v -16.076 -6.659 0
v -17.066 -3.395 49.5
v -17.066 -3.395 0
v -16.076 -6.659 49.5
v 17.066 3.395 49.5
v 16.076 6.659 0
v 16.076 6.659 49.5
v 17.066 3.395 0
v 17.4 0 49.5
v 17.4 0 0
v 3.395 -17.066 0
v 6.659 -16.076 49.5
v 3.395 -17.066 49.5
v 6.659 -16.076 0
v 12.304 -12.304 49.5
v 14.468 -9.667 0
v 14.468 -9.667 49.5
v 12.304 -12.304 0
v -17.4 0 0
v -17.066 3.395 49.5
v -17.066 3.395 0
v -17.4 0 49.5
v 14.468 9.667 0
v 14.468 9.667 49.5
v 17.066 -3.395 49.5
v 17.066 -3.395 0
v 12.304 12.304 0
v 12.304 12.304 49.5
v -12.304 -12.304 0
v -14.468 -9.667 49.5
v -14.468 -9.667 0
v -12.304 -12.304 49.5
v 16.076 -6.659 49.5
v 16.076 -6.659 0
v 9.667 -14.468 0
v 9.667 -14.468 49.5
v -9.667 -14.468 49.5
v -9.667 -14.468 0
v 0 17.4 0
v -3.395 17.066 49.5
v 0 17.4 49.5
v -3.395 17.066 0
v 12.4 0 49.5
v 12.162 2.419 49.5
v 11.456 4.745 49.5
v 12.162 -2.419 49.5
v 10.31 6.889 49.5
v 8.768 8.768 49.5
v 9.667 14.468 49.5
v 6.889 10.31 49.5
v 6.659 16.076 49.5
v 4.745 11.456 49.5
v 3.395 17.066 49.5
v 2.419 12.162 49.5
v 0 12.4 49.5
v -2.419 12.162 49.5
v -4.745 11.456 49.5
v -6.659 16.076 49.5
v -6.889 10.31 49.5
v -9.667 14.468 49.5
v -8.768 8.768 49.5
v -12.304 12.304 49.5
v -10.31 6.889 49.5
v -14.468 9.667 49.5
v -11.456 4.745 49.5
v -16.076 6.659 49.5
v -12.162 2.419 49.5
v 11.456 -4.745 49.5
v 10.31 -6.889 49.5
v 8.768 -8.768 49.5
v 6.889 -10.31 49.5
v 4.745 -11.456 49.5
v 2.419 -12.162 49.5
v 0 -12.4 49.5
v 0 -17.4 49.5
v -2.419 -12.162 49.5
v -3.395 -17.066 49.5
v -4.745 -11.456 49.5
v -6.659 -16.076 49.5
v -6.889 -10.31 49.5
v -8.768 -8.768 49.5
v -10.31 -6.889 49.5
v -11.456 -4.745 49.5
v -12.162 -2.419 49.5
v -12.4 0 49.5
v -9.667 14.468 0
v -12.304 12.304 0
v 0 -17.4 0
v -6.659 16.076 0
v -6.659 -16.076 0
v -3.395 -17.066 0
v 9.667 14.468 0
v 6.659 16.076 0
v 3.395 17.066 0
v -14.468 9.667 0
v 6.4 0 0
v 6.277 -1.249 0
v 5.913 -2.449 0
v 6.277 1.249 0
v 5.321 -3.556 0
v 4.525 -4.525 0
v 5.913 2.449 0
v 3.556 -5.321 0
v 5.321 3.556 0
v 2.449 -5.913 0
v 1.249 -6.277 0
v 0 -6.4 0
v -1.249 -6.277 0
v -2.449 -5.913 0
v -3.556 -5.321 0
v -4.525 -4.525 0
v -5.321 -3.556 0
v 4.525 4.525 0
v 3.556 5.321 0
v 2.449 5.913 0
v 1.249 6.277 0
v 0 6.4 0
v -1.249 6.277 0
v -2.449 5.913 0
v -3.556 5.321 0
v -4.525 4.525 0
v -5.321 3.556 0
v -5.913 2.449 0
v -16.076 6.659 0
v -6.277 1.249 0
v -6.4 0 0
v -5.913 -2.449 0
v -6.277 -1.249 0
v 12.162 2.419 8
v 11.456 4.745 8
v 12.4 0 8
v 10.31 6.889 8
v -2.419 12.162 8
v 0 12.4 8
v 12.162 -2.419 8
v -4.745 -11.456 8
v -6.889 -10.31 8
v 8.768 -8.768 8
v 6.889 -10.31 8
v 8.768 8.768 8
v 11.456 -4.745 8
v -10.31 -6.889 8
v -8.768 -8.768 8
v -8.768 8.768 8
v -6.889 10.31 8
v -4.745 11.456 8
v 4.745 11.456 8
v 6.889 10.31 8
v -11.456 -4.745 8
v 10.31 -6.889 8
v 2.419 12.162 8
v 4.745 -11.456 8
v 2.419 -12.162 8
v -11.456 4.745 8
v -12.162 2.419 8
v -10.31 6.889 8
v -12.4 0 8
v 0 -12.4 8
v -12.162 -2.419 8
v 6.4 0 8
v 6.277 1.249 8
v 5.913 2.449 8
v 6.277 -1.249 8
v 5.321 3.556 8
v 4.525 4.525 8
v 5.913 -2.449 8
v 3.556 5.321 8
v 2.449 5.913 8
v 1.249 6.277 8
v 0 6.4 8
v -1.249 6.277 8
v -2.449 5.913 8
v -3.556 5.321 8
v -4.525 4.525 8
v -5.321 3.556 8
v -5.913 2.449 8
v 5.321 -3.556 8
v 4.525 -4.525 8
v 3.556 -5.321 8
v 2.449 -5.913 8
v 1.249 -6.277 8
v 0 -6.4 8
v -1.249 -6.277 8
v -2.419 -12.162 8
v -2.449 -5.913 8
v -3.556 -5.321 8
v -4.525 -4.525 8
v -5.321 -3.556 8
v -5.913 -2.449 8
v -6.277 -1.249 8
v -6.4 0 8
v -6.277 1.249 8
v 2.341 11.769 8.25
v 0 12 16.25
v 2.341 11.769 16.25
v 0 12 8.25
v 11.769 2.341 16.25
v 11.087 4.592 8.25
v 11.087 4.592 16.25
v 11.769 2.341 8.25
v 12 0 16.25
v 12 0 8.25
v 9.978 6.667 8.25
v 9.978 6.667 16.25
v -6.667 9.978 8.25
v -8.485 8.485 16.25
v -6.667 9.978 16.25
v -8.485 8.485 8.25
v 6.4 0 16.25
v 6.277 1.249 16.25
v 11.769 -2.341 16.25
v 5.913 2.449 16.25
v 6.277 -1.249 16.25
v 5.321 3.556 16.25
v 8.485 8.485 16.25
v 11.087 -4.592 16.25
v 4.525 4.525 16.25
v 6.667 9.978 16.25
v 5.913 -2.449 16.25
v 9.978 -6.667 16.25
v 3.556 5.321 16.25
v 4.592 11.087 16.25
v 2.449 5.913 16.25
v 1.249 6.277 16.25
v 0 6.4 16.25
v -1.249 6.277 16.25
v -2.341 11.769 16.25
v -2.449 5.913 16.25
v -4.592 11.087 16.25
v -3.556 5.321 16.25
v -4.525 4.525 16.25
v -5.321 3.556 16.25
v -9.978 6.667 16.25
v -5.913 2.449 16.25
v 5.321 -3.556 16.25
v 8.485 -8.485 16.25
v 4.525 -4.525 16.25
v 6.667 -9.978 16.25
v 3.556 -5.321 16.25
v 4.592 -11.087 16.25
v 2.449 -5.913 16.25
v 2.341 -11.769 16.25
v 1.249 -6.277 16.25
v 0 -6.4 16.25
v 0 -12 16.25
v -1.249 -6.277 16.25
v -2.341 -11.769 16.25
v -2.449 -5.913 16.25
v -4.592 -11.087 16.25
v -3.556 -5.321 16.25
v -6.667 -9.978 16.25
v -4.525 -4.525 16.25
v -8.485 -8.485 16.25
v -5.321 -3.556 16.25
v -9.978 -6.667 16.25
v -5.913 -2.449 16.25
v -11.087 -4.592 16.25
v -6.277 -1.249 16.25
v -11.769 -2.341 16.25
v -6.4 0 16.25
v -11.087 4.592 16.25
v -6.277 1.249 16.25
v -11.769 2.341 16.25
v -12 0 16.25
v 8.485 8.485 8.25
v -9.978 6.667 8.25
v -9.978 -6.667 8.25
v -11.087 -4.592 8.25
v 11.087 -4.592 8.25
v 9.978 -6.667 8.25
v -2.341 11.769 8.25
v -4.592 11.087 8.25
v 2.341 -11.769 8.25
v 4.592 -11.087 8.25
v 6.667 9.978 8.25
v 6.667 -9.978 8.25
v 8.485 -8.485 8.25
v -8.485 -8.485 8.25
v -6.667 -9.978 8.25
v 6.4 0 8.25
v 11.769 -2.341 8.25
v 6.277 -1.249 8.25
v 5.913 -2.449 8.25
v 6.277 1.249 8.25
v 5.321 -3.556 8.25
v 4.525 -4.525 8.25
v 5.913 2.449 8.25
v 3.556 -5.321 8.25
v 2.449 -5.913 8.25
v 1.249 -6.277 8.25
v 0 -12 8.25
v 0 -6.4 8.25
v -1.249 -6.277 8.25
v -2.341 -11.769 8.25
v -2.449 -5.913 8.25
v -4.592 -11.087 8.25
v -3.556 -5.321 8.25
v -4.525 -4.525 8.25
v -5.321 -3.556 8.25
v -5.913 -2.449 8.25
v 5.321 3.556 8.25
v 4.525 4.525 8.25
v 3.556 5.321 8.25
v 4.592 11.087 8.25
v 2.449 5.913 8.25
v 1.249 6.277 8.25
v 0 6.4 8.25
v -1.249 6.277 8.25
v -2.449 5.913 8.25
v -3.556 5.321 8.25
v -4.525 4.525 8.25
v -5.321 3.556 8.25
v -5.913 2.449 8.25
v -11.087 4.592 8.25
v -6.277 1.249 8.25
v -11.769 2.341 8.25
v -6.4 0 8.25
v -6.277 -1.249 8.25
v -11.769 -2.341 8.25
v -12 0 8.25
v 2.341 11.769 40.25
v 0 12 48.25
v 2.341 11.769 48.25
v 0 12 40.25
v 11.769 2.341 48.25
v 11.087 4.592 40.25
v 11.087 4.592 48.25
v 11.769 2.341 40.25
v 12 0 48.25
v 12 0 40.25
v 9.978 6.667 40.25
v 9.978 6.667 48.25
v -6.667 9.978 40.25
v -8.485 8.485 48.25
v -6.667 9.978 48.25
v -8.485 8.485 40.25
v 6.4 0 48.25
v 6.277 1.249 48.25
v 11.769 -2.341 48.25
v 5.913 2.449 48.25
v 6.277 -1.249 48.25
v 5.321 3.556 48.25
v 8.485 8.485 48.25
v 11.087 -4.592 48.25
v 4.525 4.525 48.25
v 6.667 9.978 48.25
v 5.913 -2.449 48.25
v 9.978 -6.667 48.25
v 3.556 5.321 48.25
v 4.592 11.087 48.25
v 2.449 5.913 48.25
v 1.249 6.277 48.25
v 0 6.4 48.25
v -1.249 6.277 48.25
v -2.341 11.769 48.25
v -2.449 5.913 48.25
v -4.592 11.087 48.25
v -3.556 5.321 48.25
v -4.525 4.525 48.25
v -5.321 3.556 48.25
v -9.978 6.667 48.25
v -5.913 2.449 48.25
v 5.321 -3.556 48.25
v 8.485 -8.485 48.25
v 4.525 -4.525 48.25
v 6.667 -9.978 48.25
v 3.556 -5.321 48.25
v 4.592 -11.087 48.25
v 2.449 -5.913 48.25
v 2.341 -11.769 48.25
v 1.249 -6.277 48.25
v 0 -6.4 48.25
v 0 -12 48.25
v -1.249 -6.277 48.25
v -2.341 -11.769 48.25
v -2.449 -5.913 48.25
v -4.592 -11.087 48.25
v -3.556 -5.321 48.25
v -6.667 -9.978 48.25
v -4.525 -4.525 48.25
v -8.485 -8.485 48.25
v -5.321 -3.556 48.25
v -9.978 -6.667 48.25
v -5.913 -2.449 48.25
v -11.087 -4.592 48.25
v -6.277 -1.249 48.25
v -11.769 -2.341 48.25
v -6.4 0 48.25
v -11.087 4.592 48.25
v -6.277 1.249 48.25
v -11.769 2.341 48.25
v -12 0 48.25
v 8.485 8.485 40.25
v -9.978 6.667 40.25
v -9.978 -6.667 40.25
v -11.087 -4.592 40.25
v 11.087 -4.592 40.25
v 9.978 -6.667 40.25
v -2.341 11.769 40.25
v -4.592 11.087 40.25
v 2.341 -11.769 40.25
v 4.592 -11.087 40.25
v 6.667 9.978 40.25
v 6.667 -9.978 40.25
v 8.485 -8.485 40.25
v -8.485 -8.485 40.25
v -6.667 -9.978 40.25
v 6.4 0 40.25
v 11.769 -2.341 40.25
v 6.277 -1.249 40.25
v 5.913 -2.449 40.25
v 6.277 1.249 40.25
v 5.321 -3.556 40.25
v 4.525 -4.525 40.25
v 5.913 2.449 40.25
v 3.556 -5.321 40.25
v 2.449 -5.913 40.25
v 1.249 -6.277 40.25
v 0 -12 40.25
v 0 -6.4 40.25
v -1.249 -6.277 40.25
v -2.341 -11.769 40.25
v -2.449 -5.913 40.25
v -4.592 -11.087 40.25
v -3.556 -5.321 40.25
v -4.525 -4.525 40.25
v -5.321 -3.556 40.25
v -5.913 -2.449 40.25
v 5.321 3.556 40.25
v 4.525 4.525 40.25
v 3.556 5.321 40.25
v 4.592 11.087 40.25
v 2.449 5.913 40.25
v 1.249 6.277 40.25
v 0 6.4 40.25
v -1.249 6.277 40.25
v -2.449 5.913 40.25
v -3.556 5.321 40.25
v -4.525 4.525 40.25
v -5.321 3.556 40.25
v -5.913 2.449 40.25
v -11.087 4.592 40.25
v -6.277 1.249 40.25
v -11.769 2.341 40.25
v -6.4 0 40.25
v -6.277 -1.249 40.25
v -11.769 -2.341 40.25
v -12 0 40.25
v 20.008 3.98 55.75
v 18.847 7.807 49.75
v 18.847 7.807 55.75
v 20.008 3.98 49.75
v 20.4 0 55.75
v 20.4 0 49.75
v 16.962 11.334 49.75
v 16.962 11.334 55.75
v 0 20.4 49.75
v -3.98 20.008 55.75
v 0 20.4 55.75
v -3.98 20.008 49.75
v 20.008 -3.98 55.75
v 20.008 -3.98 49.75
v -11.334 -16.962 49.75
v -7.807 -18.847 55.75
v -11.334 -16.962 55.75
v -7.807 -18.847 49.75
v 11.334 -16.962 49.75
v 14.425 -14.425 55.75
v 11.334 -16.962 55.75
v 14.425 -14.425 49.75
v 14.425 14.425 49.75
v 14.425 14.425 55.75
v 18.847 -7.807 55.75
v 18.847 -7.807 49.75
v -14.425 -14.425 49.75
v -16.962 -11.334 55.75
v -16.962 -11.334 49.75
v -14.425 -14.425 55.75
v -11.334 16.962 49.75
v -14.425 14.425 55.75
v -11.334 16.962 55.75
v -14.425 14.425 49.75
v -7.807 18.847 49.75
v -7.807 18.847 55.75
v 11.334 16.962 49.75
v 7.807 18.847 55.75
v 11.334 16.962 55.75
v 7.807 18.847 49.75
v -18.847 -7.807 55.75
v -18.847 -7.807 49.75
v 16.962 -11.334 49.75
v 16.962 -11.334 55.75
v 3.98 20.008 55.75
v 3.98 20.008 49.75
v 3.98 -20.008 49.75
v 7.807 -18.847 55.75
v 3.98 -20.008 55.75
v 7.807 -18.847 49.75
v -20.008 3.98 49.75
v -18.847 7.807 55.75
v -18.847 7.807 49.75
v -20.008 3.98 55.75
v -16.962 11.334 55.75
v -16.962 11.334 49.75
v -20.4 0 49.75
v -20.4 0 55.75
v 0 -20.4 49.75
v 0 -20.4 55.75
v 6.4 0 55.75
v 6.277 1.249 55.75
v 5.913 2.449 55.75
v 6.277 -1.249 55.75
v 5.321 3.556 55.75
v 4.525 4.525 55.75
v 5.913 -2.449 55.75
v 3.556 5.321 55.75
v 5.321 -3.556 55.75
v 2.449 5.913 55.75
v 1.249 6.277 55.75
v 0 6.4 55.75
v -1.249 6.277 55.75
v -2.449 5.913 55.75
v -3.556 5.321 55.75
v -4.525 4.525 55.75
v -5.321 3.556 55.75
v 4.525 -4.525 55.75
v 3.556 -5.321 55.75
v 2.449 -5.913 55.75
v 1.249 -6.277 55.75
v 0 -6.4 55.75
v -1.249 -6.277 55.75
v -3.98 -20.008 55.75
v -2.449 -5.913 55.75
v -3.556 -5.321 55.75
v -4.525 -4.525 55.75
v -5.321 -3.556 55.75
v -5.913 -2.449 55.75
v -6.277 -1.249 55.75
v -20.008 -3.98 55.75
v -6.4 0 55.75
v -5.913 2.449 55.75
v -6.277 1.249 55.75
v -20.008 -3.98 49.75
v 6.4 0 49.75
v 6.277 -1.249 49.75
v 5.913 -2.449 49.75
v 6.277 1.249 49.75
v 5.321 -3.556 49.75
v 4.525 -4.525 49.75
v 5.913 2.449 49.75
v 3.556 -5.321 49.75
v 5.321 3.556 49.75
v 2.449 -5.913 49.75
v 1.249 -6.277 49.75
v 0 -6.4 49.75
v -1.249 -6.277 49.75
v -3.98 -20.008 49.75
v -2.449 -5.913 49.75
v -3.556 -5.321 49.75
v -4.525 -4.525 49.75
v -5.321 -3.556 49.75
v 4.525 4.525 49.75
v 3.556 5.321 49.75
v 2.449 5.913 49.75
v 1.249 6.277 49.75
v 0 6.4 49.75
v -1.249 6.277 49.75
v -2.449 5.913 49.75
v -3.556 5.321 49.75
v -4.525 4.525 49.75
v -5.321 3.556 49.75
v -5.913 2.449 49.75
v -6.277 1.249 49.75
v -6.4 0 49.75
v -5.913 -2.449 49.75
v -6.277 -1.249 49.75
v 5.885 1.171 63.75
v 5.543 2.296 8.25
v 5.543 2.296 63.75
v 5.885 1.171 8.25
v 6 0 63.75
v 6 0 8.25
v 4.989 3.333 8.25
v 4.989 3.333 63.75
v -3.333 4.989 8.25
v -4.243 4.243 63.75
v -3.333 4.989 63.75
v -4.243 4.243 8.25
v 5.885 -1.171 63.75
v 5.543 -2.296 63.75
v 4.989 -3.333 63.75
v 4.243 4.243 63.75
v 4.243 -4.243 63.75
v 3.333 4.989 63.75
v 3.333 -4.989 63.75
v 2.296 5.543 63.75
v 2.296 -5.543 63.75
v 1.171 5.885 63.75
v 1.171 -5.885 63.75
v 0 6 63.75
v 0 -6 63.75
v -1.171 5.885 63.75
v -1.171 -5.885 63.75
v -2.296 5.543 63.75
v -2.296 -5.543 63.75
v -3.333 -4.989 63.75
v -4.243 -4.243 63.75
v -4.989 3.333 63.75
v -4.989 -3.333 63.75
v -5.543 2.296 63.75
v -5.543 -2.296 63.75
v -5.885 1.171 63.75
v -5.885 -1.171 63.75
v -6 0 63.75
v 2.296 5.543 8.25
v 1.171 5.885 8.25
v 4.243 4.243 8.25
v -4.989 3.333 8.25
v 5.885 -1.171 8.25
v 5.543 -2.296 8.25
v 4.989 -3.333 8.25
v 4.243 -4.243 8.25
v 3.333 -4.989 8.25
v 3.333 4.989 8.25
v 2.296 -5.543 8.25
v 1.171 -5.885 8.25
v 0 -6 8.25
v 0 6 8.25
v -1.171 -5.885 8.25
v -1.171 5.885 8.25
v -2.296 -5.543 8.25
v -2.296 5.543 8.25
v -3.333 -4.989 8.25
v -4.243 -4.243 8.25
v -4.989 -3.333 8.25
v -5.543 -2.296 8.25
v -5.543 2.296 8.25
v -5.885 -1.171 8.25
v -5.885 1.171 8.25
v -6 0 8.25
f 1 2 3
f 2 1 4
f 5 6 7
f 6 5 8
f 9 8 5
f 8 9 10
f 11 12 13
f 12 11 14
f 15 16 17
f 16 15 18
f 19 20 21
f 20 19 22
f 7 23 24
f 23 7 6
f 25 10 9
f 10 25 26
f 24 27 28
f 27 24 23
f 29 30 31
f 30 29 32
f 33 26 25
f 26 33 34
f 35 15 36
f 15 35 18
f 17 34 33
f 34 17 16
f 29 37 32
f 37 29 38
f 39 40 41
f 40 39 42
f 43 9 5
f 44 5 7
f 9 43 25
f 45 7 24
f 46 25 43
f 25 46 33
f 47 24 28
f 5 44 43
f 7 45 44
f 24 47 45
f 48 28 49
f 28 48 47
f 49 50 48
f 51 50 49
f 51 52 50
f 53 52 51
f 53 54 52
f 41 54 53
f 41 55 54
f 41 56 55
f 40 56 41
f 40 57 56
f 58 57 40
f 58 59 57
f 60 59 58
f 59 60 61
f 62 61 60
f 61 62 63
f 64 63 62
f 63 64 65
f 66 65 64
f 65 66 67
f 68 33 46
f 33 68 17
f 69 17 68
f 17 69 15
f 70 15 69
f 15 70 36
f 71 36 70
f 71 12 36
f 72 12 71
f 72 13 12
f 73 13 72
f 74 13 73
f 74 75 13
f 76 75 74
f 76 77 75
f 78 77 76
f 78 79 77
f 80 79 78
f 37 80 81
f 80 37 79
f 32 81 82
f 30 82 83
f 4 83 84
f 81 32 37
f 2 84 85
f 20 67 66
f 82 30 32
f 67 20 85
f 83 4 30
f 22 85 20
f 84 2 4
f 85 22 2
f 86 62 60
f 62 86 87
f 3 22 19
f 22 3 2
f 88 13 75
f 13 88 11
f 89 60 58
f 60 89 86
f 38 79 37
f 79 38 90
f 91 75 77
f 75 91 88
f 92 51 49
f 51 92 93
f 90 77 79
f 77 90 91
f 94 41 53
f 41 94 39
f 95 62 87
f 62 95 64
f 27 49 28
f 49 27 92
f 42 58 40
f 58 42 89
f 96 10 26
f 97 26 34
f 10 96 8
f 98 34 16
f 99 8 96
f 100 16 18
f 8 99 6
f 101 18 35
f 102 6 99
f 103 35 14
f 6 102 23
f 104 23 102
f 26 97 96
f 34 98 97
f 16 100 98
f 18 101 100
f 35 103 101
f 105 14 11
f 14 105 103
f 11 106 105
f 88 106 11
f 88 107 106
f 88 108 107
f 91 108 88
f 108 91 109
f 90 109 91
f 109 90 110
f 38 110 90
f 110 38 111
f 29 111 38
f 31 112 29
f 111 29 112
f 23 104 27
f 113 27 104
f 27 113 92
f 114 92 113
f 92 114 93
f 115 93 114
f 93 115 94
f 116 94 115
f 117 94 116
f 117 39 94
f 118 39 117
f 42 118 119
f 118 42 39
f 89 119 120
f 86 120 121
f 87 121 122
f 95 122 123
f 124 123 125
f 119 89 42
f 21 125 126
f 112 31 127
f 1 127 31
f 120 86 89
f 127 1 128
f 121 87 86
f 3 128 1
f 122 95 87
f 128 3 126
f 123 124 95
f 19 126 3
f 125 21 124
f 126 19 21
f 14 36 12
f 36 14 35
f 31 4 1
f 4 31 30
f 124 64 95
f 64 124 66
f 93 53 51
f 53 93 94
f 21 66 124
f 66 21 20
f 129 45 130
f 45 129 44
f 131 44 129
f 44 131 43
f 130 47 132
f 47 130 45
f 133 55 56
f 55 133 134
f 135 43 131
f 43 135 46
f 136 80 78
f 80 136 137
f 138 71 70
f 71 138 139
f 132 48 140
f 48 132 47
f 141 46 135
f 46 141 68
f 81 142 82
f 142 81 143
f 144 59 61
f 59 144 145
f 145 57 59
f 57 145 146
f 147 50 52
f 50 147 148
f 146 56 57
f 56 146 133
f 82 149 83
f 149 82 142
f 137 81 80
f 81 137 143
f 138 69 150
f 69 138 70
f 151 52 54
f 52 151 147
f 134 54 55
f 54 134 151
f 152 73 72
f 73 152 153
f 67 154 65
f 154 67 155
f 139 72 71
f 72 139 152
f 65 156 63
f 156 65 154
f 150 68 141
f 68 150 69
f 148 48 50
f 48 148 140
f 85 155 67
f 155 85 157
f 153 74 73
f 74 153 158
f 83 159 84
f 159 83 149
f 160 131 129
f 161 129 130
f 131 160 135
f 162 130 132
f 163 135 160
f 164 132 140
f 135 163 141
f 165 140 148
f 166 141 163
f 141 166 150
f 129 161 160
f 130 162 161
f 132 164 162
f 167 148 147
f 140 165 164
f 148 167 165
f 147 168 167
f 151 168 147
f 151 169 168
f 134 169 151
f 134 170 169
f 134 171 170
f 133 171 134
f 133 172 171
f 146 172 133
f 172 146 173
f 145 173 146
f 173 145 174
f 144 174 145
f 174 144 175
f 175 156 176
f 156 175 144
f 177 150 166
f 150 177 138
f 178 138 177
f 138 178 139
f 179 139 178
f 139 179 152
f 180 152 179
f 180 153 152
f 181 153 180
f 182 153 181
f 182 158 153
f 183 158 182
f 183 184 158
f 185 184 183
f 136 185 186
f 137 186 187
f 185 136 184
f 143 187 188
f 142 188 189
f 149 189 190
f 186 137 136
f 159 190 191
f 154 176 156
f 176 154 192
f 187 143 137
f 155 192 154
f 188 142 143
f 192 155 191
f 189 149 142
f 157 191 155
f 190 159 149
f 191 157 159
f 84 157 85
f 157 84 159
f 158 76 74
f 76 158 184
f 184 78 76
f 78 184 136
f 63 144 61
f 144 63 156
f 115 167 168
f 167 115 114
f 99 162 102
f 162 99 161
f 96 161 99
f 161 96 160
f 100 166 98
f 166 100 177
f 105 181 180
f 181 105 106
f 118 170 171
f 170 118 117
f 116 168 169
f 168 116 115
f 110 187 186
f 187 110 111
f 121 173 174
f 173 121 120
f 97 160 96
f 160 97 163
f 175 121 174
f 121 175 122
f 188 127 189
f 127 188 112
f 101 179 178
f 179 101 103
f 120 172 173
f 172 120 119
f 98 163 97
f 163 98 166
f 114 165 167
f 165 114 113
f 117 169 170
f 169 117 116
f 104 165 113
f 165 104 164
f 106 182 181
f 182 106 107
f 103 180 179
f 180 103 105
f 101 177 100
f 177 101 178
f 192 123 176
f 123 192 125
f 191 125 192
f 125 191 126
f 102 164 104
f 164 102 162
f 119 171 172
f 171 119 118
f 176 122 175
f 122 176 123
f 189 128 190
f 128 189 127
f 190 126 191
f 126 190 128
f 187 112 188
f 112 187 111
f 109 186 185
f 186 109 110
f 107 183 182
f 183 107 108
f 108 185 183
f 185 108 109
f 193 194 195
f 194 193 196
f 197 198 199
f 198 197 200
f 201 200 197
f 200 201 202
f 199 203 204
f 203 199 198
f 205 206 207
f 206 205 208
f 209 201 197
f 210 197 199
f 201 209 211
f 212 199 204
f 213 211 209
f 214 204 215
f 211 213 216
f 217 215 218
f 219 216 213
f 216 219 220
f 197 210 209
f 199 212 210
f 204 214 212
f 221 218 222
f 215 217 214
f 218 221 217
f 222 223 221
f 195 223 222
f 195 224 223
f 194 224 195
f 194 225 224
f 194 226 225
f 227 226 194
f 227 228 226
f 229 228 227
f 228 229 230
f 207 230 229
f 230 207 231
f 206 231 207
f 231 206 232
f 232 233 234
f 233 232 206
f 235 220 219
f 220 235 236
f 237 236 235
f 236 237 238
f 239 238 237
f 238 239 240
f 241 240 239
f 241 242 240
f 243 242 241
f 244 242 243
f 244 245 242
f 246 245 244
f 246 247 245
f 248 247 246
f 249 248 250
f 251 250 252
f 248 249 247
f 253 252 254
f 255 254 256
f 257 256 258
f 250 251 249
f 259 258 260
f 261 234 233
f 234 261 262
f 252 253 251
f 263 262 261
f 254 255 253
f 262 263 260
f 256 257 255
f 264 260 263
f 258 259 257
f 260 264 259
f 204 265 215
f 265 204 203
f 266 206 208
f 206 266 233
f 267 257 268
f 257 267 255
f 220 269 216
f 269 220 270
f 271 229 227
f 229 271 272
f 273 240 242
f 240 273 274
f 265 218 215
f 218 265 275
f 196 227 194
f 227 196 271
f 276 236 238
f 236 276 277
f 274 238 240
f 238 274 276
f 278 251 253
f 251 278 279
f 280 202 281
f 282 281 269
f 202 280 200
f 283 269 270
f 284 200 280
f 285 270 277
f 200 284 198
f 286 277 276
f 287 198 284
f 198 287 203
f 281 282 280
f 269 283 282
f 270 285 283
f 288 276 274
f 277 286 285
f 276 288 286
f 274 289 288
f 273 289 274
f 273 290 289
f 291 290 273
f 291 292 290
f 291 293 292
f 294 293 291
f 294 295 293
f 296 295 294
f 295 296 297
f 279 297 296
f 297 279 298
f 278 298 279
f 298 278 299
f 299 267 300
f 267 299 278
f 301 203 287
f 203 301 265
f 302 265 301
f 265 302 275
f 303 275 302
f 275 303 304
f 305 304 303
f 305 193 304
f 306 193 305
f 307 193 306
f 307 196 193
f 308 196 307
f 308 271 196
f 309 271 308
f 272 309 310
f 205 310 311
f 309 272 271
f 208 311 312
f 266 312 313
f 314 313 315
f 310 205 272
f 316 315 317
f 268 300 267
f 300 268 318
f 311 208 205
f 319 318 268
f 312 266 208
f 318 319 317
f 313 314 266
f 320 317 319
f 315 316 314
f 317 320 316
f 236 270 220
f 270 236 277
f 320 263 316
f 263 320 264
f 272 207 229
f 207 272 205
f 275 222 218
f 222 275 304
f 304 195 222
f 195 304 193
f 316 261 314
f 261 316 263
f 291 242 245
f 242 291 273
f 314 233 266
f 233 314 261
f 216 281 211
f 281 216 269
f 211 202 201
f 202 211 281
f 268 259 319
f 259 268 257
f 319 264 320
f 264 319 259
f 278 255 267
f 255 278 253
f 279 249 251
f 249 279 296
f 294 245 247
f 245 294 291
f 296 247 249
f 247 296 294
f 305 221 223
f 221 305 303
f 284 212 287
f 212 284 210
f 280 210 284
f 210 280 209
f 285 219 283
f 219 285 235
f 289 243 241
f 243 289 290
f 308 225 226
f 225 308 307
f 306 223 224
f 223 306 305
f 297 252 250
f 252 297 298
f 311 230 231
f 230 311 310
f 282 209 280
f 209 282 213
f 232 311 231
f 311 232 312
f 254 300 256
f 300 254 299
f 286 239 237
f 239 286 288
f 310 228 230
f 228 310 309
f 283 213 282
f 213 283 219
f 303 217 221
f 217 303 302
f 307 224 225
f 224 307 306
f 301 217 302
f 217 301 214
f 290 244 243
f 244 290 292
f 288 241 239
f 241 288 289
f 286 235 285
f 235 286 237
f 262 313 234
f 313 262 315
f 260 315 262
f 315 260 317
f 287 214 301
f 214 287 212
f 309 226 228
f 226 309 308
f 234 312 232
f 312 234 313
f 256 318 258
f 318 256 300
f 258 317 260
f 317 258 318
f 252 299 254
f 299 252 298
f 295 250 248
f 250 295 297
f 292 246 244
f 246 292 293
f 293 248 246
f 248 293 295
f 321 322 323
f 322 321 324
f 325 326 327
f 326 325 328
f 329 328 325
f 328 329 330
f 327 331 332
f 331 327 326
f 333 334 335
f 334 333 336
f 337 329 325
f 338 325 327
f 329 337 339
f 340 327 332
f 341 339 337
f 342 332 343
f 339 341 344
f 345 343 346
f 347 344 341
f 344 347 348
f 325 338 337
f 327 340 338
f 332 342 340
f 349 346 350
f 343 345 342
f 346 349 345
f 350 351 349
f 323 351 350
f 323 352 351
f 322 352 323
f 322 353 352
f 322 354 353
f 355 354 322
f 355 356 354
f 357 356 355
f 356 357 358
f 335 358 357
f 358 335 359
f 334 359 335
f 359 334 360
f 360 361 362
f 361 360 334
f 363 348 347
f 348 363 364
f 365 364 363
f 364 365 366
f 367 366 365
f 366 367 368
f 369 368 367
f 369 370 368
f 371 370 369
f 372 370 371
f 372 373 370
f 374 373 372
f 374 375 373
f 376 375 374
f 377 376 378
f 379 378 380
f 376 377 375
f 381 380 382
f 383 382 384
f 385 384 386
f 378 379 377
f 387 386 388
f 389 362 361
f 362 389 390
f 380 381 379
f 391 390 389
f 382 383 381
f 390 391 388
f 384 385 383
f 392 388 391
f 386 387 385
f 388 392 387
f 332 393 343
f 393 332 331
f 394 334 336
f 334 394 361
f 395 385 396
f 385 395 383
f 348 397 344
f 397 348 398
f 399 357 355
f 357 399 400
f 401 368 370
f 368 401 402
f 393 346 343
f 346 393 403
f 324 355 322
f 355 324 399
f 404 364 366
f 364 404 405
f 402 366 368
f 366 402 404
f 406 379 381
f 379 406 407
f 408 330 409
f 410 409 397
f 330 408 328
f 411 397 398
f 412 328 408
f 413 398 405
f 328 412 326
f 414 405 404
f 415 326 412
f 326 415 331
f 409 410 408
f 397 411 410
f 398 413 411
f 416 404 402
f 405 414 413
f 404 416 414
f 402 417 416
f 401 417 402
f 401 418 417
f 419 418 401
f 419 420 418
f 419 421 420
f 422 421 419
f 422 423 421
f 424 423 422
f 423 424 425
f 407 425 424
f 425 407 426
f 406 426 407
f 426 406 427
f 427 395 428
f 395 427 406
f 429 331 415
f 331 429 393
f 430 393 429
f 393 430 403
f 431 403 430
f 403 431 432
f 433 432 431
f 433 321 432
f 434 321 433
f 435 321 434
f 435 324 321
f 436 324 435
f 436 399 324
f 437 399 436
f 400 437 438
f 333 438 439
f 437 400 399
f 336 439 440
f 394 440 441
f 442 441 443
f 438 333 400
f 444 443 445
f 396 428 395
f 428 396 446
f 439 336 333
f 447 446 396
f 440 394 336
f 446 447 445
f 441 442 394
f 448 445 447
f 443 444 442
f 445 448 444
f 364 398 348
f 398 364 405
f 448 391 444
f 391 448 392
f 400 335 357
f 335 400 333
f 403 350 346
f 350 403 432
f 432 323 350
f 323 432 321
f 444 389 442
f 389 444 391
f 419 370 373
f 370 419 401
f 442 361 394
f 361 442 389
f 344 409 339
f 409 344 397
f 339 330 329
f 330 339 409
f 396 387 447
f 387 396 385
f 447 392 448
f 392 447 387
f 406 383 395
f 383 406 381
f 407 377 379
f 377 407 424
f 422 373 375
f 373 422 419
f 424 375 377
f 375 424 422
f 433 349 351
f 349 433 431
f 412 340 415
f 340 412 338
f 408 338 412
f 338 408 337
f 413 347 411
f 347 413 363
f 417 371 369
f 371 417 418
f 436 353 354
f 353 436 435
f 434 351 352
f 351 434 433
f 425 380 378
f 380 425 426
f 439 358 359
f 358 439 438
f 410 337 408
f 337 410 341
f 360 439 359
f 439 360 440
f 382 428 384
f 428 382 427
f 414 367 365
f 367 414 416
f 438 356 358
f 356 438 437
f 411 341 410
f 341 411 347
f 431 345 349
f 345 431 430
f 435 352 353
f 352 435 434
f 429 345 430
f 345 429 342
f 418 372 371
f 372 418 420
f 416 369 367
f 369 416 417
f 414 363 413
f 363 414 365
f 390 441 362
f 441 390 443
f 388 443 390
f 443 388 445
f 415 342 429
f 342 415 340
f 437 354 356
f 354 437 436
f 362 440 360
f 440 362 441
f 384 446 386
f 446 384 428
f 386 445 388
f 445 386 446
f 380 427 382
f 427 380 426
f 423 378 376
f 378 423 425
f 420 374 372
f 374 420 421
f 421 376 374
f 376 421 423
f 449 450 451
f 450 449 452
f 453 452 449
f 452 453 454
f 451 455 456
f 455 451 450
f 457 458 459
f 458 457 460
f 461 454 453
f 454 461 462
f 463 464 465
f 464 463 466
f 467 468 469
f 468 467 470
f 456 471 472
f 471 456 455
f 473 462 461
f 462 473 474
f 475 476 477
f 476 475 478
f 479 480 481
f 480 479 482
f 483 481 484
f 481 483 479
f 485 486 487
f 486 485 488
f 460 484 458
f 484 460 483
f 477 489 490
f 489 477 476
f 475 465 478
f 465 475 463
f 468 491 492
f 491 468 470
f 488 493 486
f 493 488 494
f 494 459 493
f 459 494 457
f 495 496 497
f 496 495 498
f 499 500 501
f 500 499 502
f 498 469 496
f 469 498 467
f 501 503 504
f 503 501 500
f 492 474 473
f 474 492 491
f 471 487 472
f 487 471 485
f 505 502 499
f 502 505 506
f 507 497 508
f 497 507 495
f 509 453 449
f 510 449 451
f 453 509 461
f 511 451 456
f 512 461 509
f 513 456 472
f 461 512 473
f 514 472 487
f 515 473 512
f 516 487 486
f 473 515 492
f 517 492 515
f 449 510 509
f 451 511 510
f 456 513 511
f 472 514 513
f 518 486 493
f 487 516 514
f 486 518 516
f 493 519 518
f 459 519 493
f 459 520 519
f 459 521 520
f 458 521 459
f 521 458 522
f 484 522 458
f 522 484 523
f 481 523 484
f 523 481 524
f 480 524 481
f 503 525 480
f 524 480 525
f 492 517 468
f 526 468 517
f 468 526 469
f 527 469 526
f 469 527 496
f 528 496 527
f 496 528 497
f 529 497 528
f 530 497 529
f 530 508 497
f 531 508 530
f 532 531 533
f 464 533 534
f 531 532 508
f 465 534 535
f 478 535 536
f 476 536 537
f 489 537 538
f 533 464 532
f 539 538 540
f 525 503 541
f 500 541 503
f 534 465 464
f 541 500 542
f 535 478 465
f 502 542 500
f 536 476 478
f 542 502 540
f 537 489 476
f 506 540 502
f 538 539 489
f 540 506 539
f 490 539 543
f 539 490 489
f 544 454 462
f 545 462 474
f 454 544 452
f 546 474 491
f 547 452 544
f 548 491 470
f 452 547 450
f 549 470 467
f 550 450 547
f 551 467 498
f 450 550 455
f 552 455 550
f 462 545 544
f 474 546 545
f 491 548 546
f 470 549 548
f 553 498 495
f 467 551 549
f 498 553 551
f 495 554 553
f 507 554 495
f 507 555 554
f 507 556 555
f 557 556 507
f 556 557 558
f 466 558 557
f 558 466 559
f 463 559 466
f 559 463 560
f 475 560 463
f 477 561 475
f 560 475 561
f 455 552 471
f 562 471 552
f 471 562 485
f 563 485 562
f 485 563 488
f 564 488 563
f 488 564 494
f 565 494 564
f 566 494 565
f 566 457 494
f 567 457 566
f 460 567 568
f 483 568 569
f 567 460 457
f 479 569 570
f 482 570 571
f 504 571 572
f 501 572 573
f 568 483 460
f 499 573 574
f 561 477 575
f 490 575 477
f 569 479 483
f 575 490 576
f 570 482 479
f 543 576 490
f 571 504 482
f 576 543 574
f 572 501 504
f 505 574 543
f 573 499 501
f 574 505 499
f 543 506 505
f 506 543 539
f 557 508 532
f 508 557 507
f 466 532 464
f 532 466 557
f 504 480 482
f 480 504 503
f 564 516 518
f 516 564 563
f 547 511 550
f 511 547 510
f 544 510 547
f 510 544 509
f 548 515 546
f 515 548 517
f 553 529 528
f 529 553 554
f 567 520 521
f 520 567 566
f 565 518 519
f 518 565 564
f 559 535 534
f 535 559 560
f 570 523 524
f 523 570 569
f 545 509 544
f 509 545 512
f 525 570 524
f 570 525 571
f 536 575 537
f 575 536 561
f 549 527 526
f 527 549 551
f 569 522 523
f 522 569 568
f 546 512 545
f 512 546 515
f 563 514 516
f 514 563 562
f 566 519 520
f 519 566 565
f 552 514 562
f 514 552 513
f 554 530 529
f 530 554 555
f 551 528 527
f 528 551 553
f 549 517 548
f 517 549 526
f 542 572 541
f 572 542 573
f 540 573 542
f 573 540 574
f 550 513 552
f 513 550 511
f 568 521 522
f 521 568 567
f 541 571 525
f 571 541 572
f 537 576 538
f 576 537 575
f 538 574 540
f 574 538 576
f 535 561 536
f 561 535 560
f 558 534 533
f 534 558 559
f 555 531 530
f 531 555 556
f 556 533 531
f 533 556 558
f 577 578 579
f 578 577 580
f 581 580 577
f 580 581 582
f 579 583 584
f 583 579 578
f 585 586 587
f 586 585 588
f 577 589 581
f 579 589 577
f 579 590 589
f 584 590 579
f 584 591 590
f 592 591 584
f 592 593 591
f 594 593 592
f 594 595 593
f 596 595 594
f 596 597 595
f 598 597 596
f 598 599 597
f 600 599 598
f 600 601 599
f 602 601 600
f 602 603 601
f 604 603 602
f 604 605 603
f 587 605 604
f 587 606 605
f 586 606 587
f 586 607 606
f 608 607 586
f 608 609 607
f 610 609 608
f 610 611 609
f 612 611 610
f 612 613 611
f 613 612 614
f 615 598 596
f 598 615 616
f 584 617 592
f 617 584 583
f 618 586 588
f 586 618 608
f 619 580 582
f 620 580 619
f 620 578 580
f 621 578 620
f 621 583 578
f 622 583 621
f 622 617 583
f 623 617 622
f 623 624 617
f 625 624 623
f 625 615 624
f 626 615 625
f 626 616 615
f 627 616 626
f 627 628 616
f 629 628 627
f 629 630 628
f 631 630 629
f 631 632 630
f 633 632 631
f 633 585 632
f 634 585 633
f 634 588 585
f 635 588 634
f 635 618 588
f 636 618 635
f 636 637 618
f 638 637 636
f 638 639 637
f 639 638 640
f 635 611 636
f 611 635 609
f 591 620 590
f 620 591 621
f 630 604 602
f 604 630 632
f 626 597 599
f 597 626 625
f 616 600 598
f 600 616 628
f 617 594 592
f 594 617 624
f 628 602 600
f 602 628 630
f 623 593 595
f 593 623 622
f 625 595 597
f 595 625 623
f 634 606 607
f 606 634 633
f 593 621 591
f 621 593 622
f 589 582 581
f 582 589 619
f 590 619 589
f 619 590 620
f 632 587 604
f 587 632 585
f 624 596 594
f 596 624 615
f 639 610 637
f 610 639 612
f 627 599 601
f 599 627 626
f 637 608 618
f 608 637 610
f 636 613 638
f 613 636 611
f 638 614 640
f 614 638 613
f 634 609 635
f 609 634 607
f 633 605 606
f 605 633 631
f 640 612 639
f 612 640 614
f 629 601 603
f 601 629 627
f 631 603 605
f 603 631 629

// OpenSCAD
$fn = 32;

// ------------------------------------------------------------------------
// Shaft station: cup d34.8 x 49.5 mm, shaft d12
// Every part is its own module, assembly() places every instance.
// ------------------------------------------------------------------------

// --- part 1 ---
module housing_cup() {
  difference() {
    cylinder(h = 49.5, d = 34.8);
    translate([0, 0, 8]) cylinder(h = 42.5, d = 24.8);
    translate([0, 0, -1]) cylinder(h = 10, d = 12.8);
  }
}

// --- part 2 ---
module bearing_lower() {
  difference() {
      translate([0, 0, 0]) cylinder(h = 8, d = 24);
      translate([0, 0, -1]) cylinder(h = 10, d = 12.8);
    }
}

// --- part 3 ---
module bearing_upper() {
  difference() {
      translate([0, 0, 0]) cylinder(h = 8, d = 24);
      translate([0, 0, -1]) cylinder(h = 10, d = 12.8);
    }
}

// --- part 4 ---
module station_shaft() {
  translate([0, 0, -27.75]) cylinder(h = 55.5, d = 12);
}

// --- part 5 ---
module station_cover() {
  difference() {
    cylinder(h = 6, d = 40.8);
    translate([0, 0, -1]) cylinder(h = 8, d = 12.8);
  }
}

// --- assembly ---
module assembly() {
  color([0.80, 0.24, 0.20]) translate([0, 0, 0]) rotate([0, 0, 0]) housing_cup();
  color([0.20, 0.45, 0.75]) translate([0, 0, 8.25]) rotate([0, 0, 0]) bearing_lower();
  color([0.25, 0.62, 0.32]) translate([0, 0, 40.25]) rotate([0, 0, 0]) bearing_upper();
  color([0.92, 0.70, 0.18]) translate([0, 0, 36]) rotate([0, 0, 0]) station_shaft();
  color([0.58, 0.35, 0.70]) translate([0, 0, 49.75]) rotate([0, 0, 0]) station_cover();
}

assembly();
